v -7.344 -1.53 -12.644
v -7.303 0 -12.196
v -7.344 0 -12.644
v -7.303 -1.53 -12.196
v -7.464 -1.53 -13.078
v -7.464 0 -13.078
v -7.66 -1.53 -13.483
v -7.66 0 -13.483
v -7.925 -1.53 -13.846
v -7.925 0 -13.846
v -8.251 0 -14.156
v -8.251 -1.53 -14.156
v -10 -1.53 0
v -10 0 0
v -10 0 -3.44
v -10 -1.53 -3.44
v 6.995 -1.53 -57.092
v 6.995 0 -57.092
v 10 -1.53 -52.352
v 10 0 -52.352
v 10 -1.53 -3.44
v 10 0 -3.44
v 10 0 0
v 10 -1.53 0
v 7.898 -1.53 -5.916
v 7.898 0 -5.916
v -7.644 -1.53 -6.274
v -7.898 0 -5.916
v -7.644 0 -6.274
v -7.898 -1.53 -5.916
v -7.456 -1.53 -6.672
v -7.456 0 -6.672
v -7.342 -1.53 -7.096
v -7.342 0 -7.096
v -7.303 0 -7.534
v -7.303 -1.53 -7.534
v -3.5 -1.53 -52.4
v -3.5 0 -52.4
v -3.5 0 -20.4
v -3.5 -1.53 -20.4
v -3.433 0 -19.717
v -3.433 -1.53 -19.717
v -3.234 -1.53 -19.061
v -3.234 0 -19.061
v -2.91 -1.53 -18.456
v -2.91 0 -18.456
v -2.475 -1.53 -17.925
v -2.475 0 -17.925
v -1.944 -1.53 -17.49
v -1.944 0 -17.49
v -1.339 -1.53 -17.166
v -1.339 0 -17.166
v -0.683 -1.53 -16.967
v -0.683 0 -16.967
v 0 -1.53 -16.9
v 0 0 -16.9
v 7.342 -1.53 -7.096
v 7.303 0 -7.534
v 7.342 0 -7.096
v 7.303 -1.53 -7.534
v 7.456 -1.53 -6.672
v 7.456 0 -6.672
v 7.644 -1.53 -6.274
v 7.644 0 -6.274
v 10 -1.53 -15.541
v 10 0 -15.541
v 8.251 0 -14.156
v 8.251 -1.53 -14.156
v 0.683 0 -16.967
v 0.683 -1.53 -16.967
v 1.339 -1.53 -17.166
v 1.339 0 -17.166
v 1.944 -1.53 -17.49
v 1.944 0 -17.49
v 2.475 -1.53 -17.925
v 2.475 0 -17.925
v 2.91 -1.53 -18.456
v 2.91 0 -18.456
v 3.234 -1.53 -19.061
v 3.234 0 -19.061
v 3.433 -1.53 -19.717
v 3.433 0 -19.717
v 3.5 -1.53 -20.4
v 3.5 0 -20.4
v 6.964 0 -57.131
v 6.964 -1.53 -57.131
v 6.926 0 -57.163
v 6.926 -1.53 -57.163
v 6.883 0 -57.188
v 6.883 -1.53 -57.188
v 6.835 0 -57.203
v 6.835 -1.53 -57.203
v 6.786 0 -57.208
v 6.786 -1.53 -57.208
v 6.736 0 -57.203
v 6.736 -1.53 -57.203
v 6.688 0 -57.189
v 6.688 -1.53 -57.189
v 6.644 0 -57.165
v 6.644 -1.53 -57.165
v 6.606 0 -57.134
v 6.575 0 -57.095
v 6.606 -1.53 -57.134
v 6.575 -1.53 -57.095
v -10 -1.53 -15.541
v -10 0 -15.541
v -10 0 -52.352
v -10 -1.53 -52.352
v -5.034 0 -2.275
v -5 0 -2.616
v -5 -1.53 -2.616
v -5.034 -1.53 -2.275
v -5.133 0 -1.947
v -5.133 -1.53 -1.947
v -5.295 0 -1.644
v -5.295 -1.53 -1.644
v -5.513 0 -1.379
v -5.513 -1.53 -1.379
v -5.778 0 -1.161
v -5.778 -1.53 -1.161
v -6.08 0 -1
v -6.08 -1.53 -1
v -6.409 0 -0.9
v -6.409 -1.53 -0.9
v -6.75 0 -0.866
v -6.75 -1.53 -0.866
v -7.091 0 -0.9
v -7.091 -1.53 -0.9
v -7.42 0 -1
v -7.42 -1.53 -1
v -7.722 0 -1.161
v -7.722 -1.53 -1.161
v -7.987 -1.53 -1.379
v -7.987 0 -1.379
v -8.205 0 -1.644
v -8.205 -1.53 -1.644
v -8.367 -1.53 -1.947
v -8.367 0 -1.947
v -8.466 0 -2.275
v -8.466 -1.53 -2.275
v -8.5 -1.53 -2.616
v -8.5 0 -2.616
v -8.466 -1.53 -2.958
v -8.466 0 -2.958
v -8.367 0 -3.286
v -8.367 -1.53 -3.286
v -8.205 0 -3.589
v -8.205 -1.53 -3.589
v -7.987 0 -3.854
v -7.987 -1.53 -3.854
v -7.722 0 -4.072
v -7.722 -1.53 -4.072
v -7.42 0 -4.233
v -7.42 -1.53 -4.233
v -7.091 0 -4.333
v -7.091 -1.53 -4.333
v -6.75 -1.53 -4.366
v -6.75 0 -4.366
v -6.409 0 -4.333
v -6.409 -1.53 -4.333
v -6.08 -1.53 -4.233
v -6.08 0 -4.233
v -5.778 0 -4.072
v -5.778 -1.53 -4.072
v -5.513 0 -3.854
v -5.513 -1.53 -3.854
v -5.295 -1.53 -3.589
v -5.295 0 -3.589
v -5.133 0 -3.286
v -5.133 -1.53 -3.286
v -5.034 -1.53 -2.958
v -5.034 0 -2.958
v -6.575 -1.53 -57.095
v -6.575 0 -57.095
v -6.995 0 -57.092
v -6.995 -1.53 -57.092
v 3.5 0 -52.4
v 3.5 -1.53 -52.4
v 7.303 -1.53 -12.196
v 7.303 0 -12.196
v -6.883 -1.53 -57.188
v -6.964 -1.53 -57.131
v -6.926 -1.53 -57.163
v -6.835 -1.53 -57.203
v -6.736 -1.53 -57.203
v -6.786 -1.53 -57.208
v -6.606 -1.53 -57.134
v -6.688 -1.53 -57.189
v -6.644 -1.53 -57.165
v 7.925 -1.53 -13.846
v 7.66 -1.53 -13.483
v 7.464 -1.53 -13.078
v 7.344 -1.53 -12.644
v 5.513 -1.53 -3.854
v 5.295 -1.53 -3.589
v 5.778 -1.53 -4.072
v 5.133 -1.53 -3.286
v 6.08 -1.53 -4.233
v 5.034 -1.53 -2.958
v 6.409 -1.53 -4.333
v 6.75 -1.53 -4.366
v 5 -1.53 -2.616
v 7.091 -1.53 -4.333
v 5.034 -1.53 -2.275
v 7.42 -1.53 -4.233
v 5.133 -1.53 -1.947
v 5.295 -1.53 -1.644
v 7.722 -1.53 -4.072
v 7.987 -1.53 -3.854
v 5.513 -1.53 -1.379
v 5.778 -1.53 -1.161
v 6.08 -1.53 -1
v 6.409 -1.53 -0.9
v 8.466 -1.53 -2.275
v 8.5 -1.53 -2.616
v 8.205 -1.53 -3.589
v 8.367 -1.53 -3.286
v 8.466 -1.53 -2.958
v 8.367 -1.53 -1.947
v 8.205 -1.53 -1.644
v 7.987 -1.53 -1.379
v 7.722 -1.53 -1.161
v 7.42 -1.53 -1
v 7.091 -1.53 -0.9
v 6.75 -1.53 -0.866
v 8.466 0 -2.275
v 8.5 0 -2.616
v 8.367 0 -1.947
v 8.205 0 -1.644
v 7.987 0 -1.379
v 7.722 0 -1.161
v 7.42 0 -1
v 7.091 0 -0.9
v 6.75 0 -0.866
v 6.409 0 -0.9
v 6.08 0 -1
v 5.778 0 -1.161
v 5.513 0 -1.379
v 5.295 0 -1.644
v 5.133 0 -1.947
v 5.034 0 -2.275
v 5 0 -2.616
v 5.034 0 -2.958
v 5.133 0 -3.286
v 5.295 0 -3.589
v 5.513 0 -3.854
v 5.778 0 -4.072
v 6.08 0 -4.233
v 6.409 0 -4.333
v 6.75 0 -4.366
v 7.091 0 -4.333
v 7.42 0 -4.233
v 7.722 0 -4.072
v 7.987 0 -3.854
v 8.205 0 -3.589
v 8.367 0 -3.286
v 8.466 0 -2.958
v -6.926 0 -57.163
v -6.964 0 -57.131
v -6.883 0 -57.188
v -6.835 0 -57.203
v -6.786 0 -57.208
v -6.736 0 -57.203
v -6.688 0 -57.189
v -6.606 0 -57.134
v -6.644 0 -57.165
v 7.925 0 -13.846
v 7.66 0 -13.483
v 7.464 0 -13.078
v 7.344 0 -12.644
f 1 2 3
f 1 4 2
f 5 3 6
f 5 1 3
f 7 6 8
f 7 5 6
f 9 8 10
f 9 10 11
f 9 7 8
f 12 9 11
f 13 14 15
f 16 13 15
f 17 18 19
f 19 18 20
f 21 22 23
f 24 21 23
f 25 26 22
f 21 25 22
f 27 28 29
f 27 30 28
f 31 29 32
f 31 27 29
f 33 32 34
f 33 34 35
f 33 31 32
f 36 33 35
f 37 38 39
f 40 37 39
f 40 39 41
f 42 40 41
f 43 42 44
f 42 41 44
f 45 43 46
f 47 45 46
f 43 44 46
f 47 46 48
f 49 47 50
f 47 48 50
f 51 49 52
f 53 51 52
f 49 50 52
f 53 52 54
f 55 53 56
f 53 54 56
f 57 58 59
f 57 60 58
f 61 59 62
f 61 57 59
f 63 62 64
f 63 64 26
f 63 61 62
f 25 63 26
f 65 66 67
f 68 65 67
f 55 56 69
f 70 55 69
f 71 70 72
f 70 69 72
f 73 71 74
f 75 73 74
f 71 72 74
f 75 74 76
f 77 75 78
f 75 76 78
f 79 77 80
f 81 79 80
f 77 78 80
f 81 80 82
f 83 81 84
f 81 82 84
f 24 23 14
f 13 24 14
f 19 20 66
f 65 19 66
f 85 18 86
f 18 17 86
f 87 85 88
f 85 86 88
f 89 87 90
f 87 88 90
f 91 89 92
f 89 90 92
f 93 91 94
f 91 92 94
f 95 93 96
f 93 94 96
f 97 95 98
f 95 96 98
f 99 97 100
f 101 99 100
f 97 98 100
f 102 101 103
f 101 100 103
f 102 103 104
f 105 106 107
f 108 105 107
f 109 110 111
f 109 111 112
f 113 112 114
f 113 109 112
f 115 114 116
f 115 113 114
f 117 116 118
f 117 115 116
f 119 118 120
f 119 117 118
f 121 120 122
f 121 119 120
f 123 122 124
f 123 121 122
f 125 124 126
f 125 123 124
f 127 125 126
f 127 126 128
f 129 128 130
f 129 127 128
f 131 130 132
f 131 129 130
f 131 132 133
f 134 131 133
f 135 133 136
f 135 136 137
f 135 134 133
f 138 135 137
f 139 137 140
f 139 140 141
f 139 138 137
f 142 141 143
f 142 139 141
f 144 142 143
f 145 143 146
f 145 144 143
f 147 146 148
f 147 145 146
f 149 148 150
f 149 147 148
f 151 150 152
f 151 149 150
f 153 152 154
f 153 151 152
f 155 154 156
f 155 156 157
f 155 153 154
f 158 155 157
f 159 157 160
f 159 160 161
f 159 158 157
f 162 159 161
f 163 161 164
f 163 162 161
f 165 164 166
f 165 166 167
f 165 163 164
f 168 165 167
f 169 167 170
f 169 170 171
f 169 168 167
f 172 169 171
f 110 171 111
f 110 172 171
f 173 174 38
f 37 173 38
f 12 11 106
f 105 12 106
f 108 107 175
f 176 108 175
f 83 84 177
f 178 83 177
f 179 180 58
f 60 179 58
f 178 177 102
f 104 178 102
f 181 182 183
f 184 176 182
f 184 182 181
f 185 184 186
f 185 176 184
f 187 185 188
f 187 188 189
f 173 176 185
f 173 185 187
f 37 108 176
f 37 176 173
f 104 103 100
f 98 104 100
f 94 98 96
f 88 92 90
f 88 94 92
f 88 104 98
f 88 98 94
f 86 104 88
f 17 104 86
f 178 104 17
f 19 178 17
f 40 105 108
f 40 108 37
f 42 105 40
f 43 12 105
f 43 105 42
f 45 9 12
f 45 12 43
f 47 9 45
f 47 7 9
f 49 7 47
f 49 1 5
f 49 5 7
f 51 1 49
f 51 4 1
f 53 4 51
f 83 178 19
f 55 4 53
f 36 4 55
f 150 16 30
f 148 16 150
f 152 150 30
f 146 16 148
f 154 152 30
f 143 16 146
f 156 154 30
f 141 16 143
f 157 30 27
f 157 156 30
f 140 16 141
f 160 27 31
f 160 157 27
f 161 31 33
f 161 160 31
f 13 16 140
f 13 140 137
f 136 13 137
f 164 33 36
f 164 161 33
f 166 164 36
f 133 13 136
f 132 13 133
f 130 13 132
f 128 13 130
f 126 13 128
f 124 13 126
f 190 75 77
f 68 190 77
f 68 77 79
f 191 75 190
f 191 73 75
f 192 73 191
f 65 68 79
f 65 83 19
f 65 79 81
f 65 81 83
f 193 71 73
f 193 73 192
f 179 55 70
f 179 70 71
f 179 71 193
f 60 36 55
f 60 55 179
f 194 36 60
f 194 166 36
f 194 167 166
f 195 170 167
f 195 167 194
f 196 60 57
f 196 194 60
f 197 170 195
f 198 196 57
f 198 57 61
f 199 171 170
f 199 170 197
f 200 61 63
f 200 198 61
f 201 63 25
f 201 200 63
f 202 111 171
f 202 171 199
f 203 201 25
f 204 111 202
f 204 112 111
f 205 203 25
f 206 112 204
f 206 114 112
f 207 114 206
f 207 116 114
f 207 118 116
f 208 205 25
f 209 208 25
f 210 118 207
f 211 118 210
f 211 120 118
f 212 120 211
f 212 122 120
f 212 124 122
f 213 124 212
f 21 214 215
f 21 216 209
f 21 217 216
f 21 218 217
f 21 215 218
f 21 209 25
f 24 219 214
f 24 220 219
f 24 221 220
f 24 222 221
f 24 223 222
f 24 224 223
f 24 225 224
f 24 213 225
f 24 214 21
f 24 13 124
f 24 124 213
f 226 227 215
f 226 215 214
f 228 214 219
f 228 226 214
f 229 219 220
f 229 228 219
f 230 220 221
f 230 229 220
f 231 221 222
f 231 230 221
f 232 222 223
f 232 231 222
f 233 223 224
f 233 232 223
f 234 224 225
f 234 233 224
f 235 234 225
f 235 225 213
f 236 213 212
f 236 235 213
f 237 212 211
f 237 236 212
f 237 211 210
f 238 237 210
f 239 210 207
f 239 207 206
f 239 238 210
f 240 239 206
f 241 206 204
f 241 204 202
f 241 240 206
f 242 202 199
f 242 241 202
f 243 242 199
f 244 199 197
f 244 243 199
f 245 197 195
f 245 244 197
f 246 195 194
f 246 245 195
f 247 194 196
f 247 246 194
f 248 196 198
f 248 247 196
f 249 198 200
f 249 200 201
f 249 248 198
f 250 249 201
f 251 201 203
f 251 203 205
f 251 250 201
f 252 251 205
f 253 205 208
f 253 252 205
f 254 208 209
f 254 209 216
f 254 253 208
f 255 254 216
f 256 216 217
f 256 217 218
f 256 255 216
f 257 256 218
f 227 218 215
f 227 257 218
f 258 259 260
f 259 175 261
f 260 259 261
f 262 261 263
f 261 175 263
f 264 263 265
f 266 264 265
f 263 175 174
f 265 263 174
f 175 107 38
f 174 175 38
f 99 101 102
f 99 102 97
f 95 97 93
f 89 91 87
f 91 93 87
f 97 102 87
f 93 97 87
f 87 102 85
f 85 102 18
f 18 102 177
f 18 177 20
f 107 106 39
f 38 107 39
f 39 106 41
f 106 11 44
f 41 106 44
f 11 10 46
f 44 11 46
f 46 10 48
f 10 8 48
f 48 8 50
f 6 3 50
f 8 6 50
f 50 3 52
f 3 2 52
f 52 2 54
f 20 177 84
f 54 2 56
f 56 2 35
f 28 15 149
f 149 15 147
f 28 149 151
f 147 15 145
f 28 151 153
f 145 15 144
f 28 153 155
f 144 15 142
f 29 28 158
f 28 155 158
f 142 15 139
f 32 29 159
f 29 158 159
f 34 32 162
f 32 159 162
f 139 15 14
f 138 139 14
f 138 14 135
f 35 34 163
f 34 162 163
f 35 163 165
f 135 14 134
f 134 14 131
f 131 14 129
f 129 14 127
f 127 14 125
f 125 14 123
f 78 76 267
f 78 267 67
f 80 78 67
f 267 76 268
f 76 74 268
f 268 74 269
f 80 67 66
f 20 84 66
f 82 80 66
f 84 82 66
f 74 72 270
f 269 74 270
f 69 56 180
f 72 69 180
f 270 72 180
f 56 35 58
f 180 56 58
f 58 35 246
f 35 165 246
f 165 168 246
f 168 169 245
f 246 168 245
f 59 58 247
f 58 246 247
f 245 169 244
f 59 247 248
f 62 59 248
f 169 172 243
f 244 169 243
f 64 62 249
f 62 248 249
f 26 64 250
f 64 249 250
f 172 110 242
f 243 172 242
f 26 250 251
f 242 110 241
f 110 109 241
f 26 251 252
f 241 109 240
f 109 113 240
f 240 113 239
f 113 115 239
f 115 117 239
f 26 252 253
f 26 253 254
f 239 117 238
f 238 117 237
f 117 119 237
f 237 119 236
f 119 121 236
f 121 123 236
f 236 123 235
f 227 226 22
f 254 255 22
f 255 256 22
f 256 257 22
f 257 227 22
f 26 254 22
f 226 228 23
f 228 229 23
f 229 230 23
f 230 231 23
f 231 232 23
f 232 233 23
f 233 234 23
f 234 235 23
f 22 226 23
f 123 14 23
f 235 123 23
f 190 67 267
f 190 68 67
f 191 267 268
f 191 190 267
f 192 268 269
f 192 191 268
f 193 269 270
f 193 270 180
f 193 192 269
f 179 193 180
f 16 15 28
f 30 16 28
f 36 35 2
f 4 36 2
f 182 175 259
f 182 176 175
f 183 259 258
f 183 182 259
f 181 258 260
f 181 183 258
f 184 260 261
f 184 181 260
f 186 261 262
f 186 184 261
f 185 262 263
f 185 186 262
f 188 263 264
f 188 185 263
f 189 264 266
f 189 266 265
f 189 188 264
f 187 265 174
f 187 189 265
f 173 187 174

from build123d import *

# Parameters (mm, degrees)
F0_R     = 1.75
F1_DEPTH = 1.53
F2_R     = 0.25
F3_R     = 2.5


with BuildPart() as f1:
    # F0 (on Front) → F1 (new body)
    with BuildSketch(Plane.XZ):
        with BuildLine():
            Line((10, 0), (0, 0))
            Line((0, 0), (-10, 0))
            Line((-10, 0), (-10, -3.44))
            Line((-10, -3.44), (-7.303071, -6.615652))
            Line((-7.303071, -6.615652), (-7.303071, -13.405652))
            Line((-7.303071, -13.405652), (-10, -15.541108))
            Line((-10, -15.541108), (-10, -52.352146))
            Line((-10, -52.352146), (-6.78713, -57.41944))
            Line((-6.78713, -57.41944), (-3.5, -52.4))
            Line((-3.5, -52.4), (-3.5, -20.4))
            ThreePointArc((-3.5, -20.4), (-2.474874, -17.925126), (0, -16.9))
            ThreePointArc((0, -16.9), (2.474874, -17.925126), (3.5, -20.4))
            Line((3.5, -20.4), (3.5, -52.4))
            Line((3.5, -52.4), (6.78713, -57.41944))
            Line((6.78713, -57.41944), (10, -52.352146))
            Line((10, -52.352146), (10, -15.541108))
            Line((10, -15.541108), (7.303071, -13.405652))
            Line((7.303071, -13.405652), (7.303071, -6.615652))
            Line((7.303071, -6.615652), (10, -3.44))
            Line((10, -3.44), (10, 0))
        make_face()
        with Locations((-6.75, -2.616455)):
            Circle(F0_R, mode=Mode.SUBTRACT)
        with Locations((6.75, -2.616455)):
            Circle(F0_R, mode=Mode.SUBTRACT)
    extrude(amount=F1_DEPTH)

    # F2
    f2_edges = [f1.edges().sort_by_distance(p)[0] for p in [
        (-6.78713, -0.765, -57.41944),
        (6.78713, -0.765, -57.41944),
    ]]
    fillet(f2_edges, radius=F2_R)

    # F3
    f3_edges = [f1.edges().sort_by_distance(p)[0] for p in [
        (-7.303071, -0.765, -13.405652),
        (-7.303071, -0.765, -6.615652),
        (7.303071, -0.765, -6.615652),
        (7.303071, -0.765, -13.405652),
    ]]
    fillet(f3_edges, radius=F3_R)


solid = f1.part
